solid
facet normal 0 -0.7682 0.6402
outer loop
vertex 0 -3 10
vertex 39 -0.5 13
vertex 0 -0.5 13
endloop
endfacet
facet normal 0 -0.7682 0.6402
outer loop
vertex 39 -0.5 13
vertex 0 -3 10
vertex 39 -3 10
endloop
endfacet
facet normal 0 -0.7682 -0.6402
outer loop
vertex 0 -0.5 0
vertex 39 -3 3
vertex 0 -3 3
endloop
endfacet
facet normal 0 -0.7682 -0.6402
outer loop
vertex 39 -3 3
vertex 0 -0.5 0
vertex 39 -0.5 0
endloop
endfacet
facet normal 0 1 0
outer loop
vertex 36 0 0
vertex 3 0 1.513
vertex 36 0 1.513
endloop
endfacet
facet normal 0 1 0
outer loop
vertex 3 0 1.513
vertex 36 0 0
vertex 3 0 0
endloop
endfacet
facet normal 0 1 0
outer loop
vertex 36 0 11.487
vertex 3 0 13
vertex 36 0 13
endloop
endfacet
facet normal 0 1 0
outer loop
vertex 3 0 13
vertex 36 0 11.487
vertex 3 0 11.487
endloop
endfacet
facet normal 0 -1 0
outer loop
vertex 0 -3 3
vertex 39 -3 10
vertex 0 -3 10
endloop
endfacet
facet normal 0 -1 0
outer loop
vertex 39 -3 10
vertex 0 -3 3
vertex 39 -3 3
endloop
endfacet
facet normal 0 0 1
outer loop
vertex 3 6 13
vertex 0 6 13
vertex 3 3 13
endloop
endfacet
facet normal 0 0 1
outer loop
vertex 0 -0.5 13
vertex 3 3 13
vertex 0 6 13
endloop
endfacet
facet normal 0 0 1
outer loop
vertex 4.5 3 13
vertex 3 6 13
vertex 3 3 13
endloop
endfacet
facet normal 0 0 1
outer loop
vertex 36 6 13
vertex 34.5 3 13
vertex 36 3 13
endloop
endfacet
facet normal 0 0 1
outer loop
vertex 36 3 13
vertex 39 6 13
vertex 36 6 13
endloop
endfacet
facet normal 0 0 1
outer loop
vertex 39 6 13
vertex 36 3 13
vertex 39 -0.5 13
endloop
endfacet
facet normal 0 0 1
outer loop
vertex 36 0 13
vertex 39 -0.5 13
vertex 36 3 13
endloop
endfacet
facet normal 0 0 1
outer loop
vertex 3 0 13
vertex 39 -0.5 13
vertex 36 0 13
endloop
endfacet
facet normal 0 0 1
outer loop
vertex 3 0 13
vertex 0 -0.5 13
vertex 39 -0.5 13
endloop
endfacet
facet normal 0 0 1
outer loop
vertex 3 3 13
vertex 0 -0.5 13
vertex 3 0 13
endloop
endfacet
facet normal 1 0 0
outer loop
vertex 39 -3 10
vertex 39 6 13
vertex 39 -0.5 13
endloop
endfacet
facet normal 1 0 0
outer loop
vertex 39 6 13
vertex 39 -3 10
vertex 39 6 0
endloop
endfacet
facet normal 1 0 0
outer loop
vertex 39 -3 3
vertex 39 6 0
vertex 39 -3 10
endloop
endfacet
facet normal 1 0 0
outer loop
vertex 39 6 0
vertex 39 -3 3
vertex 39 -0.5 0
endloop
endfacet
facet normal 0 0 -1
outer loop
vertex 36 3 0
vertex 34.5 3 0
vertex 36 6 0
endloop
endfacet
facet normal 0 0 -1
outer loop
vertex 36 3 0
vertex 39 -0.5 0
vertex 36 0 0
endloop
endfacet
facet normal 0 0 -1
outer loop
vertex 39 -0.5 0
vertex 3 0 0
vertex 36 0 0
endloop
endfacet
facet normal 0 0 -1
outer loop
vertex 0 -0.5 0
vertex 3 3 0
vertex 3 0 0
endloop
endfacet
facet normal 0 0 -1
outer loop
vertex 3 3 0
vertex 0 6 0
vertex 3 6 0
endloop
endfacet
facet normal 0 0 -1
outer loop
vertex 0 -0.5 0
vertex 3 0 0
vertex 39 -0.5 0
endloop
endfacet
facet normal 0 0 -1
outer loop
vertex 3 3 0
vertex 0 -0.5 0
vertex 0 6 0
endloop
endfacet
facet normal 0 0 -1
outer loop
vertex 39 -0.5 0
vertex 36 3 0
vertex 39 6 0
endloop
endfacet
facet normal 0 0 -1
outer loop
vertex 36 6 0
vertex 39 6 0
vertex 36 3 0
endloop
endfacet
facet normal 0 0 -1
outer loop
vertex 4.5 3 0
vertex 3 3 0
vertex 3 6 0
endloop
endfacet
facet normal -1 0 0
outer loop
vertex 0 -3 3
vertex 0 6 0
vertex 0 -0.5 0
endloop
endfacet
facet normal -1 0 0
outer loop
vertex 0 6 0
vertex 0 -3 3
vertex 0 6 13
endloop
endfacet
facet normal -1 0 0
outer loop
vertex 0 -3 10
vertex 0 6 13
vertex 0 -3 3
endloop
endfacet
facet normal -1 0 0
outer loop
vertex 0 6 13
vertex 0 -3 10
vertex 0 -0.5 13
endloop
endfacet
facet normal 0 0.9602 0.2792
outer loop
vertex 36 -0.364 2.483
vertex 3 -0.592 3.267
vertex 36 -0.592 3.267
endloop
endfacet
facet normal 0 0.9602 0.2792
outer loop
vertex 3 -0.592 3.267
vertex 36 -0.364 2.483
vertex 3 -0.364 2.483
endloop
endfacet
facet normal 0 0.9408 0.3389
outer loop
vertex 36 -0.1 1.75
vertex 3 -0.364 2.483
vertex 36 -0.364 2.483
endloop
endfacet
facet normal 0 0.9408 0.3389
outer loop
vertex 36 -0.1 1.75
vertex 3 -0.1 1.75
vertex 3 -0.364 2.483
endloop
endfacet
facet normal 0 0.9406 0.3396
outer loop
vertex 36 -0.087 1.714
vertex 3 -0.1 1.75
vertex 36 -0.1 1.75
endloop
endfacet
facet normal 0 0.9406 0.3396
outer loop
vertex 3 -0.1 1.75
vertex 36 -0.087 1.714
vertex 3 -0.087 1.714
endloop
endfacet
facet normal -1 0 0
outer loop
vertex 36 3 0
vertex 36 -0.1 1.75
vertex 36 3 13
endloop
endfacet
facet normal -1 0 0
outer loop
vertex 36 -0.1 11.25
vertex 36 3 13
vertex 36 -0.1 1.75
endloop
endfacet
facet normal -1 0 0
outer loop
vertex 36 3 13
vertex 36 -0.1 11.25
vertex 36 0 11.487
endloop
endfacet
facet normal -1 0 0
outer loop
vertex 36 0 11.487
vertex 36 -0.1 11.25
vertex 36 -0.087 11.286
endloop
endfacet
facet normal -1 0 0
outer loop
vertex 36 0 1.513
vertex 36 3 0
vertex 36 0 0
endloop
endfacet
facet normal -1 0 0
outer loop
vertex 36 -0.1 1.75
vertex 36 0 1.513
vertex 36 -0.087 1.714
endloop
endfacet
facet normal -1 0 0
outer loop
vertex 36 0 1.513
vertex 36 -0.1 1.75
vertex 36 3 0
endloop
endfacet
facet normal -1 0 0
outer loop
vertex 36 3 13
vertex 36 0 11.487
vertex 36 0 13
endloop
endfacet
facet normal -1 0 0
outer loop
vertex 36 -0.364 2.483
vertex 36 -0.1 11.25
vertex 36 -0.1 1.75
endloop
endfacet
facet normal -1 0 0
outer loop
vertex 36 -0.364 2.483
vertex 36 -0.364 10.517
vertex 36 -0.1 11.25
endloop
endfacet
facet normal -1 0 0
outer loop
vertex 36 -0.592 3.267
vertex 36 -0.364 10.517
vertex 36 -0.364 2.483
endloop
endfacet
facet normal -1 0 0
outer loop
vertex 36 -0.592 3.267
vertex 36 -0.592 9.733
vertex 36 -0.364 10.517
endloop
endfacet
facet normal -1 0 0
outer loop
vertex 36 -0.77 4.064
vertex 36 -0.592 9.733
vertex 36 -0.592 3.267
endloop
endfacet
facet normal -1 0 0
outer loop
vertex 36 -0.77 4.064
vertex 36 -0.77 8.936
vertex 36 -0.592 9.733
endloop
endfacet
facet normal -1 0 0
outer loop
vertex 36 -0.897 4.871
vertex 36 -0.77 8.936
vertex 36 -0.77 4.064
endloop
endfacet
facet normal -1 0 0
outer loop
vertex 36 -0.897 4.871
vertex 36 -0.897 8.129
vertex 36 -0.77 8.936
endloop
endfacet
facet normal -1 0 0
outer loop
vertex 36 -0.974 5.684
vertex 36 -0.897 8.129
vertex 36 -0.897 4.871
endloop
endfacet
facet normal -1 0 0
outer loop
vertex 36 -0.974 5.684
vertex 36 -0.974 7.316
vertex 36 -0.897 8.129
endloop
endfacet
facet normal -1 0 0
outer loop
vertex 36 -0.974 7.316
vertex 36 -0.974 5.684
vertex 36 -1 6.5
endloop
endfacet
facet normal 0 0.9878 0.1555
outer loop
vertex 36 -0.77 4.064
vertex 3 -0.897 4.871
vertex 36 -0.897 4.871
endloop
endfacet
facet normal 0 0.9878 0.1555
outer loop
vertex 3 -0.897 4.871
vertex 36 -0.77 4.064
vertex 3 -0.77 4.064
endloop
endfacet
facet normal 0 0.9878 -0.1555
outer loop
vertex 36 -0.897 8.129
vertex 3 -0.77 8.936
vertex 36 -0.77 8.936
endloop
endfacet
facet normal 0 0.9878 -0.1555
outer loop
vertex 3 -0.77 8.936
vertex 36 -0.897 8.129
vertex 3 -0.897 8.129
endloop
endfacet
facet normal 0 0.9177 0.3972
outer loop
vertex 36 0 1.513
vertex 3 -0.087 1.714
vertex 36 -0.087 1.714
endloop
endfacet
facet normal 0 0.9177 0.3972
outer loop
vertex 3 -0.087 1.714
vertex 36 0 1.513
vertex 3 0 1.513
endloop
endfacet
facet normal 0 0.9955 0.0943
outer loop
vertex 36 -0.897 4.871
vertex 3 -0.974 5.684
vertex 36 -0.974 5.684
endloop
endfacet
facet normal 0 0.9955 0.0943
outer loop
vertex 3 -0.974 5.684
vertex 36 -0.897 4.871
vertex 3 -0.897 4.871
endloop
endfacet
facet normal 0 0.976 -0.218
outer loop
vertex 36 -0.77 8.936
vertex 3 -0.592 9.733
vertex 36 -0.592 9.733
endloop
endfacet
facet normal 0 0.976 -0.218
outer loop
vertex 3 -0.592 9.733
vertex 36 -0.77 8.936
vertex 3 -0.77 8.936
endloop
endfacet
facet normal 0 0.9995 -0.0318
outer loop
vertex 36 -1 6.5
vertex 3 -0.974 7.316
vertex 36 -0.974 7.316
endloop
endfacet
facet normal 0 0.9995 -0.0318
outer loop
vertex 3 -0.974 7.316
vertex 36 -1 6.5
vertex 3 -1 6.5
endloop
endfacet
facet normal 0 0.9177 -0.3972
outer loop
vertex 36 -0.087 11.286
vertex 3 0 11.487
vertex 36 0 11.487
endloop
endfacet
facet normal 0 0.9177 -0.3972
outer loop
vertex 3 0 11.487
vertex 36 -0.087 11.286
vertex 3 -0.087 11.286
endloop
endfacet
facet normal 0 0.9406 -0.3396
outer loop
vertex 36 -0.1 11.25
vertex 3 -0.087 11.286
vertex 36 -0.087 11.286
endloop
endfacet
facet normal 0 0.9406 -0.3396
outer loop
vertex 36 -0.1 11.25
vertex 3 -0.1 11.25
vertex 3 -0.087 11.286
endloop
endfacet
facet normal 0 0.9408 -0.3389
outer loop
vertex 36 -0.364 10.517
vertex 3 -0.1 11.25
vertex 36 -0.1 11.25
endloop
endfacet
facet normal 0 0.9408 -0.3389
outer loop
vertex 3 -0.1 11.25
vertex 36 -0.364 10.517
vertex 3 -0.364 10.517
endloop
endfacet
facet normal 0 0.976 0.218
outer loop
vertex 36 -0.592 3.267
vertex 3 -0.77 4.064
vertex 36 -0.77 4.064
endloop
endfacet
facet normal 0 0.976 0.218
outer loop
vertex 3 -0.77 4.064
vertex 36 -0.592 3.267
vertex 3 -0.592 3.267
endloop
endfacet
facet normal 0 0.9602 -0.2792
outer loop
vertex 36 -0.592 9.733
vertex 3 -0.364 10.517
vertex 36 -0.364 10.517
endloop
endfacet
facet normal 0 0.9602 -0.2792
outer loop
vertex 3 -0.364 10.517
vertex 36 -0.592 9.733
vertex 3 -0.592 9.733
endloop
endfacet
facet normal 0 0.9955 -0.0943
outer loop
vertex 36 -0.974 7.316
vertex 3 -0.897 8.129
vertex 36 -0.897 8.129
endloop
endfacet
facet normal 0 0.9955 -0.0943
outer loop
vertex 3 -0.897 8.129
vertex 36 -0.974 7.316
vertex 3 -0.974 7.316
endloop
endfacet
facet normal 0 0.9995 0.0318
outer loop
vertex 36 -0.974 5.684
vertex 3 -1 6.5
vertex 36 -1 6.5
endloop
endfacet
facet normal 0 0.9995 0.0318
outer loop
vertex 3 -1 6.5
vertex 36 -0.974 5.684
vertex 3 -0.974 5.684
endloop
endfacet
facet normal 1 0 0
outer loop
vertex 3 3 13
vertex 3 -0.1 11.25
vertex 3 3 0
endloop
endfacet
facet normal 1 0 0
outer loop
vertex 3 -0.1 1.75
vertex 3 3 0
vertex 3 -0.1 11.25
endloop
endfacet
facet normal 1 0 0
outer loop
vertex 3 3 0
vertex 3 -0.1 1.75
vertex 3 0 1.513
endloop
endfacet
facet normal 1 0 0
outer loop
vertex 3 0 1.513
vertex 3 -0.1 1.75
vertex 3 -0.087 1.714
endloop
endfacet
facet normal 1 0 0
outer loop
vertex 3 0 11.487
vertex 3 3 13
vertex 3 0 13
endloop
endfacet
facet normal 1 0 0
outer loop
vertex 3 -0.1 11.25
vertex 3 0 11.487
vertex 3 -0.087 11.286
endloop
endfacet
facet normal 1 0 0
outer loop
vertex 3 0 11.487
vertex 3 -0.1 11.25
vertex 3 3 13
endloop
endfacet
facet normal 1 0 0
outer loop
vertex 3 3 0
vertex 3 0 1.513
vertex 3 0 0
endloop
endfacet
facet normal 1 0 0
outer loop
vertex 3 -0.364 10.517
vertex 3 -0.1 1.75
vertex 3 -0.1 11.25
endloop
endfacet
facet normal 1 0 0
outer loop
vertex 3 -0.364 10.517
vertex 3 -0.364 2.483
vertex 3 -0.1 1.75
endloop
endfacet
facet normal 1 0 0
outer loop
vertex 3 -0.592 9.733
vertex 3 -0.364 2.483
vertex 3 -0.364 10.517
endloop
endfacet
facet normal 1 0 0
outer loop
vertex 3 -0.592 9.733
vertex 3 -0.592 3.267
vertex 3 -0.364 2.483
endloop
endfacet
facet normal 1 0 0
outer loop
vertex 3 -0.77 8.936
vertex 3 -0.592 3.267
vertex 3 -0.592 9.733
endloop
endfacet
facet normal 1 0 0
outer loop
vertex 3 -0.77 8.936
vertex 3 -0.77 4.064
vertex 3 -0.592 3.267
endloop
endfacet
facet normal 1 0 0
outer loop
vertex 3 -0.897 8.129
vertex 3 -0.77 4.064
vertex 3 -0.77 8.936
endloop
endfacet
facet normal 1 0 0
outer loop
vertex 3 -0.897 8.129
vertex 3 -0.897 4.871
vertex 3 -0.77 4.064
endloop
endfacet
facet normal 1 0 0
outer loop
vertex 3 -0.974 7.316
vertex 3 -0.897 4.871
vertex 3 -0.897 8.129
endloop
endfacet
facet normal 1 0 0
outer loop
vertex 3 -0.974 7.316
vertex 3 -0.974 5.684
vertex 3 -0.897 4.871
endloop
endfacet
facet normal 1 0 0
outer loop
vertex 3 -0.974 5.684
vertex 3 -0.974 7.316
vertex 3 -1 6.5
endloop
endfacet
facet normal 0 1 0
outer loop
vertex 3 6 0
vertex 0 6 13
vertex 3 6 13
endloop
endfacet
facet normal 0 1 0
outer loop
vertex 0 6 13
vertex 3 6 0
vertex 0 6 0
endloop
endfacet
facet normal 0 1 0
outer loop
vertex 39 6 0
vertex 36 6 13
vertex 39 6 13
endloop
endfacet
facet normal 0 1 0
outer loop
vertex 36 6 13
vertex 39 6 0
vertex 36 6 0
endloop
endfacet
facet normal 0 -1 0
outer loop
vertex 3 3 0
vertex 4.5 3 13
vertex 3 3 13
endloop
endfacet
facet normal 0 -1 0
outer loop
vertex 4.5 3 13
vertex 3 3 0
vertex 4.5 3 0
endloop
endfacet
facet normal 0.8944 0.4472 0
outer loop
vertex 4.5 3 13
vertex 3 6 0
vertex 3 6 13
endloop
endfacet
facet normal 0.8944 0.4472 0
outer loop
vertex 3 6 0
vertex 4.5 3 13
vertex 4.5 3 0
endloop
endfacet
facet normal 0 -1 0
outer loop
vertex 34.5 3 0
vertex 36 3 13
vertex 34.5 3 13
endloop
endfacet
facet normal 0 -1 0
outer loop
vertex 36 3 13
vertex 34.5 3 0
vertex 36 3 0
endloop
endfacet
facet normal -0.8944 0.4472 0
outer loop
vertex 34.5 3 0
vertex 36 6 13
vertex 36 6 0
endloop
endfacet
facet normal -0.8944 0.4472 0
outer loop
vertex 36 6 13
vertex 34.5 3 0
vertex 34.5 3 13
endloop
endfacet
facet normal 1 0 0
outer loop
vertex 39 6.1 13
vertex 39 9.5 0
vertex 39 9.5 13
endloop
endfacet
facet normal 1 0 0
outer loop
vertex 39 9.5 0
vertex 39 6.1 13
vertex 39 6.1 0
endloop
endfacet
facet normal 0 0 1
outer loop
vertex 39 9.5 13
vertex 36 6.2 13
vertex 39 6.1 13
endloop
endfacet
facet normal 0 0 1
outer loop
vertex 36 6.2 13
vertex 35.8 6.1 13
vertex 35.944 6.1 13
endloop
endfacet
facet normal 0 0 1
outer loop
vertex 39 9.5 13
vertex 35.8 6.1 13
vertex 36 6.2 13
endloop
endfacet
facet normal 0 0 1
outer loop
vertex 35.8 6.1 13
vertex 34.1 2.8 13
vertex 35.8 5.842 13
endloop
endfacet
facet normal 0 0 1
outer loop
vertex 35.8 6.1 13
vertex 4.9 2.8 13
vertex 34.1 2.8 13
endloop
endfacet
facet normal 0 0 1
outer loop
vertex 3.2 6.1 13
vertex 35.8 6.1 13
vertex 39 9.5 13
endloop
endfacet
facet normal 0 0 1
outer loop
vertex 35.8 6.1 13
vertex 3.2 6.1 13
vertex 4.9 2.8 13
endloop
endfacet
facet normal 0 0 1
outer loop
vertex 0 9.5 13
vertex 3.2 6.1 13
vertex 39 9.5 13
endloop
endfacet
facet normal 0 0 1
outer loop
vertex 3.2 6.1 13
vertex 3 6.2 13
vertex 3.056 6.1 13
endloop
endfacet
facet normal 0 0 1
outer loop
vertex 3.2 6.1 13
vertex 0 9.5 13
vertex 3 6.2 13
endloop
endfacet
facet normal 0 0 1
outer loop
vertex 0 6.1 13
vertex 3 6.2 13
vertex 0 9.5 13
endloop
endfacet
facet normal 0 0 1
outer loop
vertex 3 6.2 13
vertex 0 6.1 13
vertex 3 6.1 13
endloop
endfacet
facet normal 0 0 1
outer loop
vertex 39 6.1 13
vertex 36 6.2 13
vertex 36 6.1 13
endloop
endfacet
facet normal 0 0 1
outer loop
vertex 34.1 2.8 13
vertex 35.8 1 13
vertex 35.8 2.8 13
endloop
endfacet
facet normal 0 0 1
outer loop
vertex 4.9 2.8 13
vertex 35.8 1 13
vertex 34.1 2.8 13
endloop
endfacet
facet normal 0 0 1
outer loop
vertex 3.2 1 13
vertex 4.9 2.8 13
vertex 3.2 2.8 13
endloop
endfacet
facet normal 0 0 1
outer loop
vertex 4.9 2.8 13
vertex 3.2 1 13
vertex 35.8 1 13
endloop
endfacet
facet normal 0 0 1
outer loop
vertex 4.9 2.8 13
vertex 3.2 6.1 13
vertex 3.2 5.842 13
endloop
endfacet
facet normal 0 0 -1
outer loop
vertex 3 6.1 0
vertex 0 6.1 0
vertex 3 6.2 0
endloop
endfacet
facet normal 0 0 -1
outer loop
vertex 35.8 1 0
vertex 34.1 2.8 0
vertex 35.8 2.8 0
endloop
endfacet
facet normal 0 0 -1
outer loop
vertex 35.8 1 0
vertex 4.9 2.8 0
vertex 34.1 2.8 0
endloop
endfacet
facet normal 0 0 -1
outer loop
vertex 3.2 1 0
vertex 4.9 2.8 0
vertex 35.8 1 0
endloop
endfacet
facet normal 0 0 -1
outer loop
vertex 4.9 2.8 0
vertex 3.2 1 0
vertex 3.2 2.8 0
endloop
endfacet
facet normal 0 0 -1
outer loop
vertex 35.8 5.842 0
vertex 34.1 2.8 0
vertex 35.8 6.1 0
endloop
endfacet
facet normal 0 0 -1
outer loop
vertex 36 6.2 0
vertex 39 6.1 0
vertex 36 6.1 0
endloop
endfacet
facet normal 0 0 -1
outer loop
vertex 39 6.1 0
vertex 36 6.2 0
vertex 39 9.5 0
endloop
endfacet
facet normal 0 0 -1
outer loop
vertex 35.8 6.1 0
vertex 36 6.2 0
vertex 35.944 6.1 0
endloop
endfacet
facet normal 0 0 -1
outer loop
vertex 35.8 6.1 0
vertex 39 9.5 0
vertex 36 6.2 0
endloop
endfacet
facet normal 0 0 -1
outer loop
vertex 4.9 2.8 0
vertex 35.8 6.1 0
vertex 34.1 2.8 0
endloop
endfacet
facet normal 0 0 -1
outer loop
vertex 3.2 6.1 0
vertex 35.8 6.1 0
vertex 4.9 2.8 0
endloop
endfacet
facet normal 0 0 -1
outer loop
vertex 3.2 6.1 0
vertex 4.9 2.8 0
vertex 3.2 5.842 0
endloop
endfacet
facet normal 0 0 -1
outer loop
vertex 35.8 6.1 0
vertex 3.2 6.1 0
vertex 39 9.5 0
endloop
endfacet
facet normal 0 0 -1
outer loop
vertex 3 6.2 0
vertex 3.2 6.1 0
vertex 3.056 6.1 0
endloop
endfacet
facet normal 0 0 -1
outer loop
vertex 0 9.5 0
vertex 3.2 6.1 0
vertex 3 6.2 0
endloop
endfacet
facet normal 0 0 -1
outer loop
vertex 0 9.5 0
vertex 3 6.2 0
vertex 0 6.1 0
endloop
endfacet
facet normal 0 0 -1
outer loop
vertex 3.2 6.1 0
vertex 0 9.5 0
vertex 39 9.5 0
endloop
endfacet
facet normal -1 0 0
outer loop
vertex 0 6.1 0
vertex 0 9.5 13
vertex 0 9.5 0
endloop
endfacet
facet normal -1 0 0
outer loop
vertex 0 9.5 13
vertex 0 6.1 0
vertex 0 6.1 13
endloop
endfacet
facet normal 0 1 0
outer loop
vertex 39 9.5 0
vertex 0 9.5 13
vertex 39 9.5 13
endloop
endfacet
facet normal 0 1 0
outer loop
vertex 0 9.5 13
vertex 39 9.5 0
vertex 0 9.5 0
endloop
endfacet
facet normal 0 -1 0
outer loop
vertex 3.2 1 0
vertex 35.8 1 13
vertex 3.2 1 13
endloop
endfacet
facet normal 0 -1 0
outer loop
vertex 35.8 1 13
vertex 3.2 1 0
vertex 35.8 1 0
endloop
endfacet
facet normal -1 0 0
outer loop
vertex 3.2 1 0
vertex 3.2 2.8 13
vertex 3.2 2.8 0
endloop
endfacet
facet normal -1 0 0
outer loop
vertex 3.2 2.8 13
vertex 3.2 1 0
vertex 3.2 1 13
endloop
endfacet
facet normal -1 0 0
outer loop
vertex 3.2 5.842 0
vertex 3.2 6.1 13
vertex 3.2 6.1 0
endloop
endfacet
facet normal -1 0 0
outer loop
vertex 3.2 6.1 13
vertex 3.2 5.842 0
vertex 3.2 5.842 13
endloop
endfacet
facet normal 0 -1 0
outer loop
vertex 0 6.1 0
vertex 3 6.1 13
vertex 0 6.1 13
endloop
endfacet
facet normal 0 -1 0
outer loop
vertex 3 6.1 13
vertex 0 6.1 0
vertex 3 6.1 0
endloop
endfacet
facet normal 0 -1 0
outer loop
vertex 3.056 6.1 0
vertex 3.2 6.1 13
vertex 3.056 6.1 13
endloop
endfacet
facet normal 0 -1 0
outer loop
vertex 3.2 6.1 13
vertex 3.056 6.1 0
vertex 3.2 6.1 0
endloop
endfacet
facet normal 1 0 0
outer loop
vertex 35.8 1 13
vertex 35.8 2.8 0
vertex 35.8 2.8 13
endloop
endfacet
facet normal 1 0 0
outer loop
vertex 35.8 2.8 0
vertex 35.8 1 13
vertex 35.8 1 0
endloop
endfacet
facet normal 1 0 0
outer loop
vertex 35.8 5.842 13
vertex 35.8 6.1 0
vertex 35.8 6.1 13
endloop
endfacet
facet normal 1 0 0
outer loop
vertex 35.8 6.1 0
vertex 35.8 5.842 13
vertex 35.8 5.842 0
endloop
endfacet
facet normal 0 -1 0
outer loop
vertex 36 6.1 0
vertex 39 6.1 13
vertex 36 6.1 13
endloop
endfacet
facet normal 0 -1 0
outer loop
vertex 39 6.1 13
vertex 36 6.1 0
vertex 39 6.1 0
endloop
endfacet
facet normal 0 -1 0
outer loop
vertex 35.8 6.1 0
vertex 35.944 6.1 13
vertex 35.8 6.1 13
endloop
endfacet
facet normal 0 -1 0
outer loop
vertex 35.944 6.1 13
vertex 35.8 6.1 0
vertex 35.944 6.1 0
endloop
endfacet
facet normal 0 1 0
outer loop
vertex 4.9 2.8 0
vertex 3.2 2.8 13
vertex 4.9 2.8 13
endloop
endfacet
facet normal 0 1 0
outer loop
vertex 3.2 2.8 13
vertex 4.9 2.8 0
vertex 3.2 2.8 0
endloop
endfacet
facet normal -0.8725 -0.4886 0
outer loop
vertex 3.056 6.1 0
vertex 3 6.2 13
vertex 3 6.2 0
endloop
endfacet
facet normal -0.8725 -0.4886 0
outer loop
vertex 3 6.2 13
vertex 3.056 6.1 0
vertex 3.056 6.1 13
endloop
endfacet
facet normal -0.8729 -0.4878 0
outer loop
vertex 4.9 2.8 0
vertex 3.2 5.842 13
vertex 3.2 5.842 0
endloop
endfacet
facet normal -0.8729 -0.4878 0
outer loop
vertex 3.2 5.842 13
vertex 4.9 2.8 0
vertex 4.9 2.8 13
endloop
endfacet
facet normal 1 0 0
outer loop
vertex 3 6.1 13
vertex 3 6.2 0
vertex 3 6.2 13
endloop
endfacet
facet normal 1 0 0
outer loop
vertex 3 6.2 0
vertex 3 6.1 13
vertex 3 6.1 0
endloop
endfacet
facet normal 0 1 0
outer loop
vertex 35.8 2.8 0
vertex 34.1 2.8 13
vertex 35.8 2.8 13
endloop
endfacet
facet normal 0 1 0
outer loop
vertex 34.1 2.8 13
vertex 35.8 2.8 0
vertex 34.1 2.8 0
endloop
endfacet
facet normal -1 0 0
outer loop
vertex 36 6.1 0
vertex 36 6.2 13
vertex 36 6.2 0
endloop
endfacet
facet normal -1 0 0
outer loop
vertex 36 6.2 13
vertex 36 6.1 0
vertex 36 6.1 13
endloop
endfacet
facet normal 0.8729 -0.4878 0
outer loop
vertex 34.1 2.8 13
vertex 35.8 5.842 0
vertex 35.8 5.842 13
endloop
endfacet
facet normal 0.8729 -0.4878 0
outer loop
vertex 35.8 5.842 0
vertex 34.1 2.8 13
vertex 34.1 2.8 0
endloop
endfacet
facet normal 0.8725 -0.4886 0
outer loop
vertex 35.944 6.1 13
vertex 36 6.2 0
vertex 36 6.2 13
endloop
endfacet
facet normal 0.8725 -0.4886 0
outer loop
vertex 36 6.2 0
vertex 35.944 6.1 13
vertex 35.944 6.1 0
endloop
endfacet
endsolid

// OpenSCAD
// -----------------------------------------------------
// Foldback-Klammer-Adapter
//
//  Detlev Ahlgrimm, 04.2018
// -----------------------------------------------------

// length of foldback clip
Length=32;

// width of foldback clip
Width=15;

// thickness of this thing
Thickness=3;      // [2:5]

// switch beween print-view and assembly-view
AssemblyView=1;   // [0:format for printing,1:how to assemble]

$fn=100;

// -----------------------------------------------------
// for Foldback-Clips with
//    Length =   51mm   41mm    32mm   25mm
//    Width  =   22mm   18mm    15mm   12mm
//  https://www.amazon.de/gp/product/B01MU180XF
// -----------------------------------------------------
module FoldbackAdapterA(l, b, t=3, brim=true) {
  w=b-2;
  l2=l+1;
  difference() {
    translate([l2+2*t, 0, 0]) rotate([90, 0, -90]) linear_extrude(l2+2*t) polygon([[0, t], [0, w-t], [-t+0.5, w], [-t, w], [-t, 0], [-t+0.5, 0]]);
    translate([t, w+t-1, w/2]) rotate([0, 90, 0]) cylinder(r=w, h=l2);
  }
  translate([0,   t-0.1, 0]) cube([t, 2*t+0.1, w]);
  translate([l2+t, t-0.1, 0]) cube([t, 2*t+0.1, w]);
  translate([t-0.1,    2*t, 0]) linear_extrude(w) polygon([[0, 0], [t/2+0.1,  0], [ 0.1, t]]);
  translate([l2+t+0.1, 2*t, 0]) linear_extrude(w) polygon([[0, 0], [-t/2-0.1, 0], [-0.1, t]]);

  if(brim) {
    translate([1.5*t+5, t+6, 0]) cylinder(r=4, h=0.3);
    translate([1.5*t+4.5, t, 0]) cube([1, 4, 0.3]);
    
    translate([l2/2+t, t+6, 0]) cylinder(r=4, h=0.3);
    translate([l2/2+t-0.5, t, 0]) cube([1, 4, 0.3]);
    
    translate([l2+t/2-5, t+6, 0]) cylinder(r=4, h=0.3);
    translate([l2+t/2-5.5, t, 0]) cube([1, 4, 0.3]);
  }
}
//!FoldbackAdapterA(51, 22, t=3);
//!FoldbackAdapterA(41, 18);
//!FoldbackAdapterA(32, 15);

// -----------------------------------------------------
//
// -----------------------------------------------------
module FoldbackAdapterB(l, b, t=3) {
  w=b-2;
  l2=l+1;
  difference() {
    translate([0, 1, 0]) cube([l2+2*t, 3*t-0.5, w]);
    translate([-0.1,    -0.1, -0.1]) cube([t+0.3, 2*t+0.2, w+0.2]);
    translate([l2+t-0.2, -0.1, -0.1]) cube([t+0.3, 2*t+0.2, w+0.2]);
    translate([t,    t-0.2, -0.1]) linear_extrude(w+0.2) polygon([[0, 0], [t/2+0.4,  0], [0, t+0.4]]);
    translate([l2+t, t-0.2, -0.1]) linear_extrude(w+0.2) polygon([[0, 0], [-t/2-0.4, 0], [0, t+0.4]]);
  }

  /*translate([2+l/2+t-10, 3*t-10.1, 0]) difference() {
    Arm(42, m=0);
    translate([-2.1, -10, -0.1]) cube([20.2, 19.9, 10]);
  }
  difference() {
    union() {
      translate([2+l/2+t-10, 3*t+1-0.6, 5.9]) rotate([0, -90, 0]) linear_extrude(2) polygon([[0,0], [0,w-6], [w-6,0]]);
      translate([2+l/2+t+8, 3*t+1-0.6, 5.9]) rotate([0, -90, 0]) linear_extrude(2) polygon([[0,0], [0,w-6], [w-6,0]]);
    }
    translate([-0.1, 3*t+1+w-6, w]) rotate([0, 90, 0]) cylinder(r=w-6, h=l+2*t+0.2);
  }*/
}

if(AssemblyView==1) {
  translate([0, -Thickness, 0]) FoldbackAdapterA(Length, Width, Thickness, brim=false);     // Montage
  FoldbackAdapterB(Length, Width, Thickness);
} else {
  translate([0, Width+Thickness, 0]) FoldbackAdapterA(Length, Width, Thickness);            // Druck
  FoldbackAdapterB(Length, Width, Thickness);
}
